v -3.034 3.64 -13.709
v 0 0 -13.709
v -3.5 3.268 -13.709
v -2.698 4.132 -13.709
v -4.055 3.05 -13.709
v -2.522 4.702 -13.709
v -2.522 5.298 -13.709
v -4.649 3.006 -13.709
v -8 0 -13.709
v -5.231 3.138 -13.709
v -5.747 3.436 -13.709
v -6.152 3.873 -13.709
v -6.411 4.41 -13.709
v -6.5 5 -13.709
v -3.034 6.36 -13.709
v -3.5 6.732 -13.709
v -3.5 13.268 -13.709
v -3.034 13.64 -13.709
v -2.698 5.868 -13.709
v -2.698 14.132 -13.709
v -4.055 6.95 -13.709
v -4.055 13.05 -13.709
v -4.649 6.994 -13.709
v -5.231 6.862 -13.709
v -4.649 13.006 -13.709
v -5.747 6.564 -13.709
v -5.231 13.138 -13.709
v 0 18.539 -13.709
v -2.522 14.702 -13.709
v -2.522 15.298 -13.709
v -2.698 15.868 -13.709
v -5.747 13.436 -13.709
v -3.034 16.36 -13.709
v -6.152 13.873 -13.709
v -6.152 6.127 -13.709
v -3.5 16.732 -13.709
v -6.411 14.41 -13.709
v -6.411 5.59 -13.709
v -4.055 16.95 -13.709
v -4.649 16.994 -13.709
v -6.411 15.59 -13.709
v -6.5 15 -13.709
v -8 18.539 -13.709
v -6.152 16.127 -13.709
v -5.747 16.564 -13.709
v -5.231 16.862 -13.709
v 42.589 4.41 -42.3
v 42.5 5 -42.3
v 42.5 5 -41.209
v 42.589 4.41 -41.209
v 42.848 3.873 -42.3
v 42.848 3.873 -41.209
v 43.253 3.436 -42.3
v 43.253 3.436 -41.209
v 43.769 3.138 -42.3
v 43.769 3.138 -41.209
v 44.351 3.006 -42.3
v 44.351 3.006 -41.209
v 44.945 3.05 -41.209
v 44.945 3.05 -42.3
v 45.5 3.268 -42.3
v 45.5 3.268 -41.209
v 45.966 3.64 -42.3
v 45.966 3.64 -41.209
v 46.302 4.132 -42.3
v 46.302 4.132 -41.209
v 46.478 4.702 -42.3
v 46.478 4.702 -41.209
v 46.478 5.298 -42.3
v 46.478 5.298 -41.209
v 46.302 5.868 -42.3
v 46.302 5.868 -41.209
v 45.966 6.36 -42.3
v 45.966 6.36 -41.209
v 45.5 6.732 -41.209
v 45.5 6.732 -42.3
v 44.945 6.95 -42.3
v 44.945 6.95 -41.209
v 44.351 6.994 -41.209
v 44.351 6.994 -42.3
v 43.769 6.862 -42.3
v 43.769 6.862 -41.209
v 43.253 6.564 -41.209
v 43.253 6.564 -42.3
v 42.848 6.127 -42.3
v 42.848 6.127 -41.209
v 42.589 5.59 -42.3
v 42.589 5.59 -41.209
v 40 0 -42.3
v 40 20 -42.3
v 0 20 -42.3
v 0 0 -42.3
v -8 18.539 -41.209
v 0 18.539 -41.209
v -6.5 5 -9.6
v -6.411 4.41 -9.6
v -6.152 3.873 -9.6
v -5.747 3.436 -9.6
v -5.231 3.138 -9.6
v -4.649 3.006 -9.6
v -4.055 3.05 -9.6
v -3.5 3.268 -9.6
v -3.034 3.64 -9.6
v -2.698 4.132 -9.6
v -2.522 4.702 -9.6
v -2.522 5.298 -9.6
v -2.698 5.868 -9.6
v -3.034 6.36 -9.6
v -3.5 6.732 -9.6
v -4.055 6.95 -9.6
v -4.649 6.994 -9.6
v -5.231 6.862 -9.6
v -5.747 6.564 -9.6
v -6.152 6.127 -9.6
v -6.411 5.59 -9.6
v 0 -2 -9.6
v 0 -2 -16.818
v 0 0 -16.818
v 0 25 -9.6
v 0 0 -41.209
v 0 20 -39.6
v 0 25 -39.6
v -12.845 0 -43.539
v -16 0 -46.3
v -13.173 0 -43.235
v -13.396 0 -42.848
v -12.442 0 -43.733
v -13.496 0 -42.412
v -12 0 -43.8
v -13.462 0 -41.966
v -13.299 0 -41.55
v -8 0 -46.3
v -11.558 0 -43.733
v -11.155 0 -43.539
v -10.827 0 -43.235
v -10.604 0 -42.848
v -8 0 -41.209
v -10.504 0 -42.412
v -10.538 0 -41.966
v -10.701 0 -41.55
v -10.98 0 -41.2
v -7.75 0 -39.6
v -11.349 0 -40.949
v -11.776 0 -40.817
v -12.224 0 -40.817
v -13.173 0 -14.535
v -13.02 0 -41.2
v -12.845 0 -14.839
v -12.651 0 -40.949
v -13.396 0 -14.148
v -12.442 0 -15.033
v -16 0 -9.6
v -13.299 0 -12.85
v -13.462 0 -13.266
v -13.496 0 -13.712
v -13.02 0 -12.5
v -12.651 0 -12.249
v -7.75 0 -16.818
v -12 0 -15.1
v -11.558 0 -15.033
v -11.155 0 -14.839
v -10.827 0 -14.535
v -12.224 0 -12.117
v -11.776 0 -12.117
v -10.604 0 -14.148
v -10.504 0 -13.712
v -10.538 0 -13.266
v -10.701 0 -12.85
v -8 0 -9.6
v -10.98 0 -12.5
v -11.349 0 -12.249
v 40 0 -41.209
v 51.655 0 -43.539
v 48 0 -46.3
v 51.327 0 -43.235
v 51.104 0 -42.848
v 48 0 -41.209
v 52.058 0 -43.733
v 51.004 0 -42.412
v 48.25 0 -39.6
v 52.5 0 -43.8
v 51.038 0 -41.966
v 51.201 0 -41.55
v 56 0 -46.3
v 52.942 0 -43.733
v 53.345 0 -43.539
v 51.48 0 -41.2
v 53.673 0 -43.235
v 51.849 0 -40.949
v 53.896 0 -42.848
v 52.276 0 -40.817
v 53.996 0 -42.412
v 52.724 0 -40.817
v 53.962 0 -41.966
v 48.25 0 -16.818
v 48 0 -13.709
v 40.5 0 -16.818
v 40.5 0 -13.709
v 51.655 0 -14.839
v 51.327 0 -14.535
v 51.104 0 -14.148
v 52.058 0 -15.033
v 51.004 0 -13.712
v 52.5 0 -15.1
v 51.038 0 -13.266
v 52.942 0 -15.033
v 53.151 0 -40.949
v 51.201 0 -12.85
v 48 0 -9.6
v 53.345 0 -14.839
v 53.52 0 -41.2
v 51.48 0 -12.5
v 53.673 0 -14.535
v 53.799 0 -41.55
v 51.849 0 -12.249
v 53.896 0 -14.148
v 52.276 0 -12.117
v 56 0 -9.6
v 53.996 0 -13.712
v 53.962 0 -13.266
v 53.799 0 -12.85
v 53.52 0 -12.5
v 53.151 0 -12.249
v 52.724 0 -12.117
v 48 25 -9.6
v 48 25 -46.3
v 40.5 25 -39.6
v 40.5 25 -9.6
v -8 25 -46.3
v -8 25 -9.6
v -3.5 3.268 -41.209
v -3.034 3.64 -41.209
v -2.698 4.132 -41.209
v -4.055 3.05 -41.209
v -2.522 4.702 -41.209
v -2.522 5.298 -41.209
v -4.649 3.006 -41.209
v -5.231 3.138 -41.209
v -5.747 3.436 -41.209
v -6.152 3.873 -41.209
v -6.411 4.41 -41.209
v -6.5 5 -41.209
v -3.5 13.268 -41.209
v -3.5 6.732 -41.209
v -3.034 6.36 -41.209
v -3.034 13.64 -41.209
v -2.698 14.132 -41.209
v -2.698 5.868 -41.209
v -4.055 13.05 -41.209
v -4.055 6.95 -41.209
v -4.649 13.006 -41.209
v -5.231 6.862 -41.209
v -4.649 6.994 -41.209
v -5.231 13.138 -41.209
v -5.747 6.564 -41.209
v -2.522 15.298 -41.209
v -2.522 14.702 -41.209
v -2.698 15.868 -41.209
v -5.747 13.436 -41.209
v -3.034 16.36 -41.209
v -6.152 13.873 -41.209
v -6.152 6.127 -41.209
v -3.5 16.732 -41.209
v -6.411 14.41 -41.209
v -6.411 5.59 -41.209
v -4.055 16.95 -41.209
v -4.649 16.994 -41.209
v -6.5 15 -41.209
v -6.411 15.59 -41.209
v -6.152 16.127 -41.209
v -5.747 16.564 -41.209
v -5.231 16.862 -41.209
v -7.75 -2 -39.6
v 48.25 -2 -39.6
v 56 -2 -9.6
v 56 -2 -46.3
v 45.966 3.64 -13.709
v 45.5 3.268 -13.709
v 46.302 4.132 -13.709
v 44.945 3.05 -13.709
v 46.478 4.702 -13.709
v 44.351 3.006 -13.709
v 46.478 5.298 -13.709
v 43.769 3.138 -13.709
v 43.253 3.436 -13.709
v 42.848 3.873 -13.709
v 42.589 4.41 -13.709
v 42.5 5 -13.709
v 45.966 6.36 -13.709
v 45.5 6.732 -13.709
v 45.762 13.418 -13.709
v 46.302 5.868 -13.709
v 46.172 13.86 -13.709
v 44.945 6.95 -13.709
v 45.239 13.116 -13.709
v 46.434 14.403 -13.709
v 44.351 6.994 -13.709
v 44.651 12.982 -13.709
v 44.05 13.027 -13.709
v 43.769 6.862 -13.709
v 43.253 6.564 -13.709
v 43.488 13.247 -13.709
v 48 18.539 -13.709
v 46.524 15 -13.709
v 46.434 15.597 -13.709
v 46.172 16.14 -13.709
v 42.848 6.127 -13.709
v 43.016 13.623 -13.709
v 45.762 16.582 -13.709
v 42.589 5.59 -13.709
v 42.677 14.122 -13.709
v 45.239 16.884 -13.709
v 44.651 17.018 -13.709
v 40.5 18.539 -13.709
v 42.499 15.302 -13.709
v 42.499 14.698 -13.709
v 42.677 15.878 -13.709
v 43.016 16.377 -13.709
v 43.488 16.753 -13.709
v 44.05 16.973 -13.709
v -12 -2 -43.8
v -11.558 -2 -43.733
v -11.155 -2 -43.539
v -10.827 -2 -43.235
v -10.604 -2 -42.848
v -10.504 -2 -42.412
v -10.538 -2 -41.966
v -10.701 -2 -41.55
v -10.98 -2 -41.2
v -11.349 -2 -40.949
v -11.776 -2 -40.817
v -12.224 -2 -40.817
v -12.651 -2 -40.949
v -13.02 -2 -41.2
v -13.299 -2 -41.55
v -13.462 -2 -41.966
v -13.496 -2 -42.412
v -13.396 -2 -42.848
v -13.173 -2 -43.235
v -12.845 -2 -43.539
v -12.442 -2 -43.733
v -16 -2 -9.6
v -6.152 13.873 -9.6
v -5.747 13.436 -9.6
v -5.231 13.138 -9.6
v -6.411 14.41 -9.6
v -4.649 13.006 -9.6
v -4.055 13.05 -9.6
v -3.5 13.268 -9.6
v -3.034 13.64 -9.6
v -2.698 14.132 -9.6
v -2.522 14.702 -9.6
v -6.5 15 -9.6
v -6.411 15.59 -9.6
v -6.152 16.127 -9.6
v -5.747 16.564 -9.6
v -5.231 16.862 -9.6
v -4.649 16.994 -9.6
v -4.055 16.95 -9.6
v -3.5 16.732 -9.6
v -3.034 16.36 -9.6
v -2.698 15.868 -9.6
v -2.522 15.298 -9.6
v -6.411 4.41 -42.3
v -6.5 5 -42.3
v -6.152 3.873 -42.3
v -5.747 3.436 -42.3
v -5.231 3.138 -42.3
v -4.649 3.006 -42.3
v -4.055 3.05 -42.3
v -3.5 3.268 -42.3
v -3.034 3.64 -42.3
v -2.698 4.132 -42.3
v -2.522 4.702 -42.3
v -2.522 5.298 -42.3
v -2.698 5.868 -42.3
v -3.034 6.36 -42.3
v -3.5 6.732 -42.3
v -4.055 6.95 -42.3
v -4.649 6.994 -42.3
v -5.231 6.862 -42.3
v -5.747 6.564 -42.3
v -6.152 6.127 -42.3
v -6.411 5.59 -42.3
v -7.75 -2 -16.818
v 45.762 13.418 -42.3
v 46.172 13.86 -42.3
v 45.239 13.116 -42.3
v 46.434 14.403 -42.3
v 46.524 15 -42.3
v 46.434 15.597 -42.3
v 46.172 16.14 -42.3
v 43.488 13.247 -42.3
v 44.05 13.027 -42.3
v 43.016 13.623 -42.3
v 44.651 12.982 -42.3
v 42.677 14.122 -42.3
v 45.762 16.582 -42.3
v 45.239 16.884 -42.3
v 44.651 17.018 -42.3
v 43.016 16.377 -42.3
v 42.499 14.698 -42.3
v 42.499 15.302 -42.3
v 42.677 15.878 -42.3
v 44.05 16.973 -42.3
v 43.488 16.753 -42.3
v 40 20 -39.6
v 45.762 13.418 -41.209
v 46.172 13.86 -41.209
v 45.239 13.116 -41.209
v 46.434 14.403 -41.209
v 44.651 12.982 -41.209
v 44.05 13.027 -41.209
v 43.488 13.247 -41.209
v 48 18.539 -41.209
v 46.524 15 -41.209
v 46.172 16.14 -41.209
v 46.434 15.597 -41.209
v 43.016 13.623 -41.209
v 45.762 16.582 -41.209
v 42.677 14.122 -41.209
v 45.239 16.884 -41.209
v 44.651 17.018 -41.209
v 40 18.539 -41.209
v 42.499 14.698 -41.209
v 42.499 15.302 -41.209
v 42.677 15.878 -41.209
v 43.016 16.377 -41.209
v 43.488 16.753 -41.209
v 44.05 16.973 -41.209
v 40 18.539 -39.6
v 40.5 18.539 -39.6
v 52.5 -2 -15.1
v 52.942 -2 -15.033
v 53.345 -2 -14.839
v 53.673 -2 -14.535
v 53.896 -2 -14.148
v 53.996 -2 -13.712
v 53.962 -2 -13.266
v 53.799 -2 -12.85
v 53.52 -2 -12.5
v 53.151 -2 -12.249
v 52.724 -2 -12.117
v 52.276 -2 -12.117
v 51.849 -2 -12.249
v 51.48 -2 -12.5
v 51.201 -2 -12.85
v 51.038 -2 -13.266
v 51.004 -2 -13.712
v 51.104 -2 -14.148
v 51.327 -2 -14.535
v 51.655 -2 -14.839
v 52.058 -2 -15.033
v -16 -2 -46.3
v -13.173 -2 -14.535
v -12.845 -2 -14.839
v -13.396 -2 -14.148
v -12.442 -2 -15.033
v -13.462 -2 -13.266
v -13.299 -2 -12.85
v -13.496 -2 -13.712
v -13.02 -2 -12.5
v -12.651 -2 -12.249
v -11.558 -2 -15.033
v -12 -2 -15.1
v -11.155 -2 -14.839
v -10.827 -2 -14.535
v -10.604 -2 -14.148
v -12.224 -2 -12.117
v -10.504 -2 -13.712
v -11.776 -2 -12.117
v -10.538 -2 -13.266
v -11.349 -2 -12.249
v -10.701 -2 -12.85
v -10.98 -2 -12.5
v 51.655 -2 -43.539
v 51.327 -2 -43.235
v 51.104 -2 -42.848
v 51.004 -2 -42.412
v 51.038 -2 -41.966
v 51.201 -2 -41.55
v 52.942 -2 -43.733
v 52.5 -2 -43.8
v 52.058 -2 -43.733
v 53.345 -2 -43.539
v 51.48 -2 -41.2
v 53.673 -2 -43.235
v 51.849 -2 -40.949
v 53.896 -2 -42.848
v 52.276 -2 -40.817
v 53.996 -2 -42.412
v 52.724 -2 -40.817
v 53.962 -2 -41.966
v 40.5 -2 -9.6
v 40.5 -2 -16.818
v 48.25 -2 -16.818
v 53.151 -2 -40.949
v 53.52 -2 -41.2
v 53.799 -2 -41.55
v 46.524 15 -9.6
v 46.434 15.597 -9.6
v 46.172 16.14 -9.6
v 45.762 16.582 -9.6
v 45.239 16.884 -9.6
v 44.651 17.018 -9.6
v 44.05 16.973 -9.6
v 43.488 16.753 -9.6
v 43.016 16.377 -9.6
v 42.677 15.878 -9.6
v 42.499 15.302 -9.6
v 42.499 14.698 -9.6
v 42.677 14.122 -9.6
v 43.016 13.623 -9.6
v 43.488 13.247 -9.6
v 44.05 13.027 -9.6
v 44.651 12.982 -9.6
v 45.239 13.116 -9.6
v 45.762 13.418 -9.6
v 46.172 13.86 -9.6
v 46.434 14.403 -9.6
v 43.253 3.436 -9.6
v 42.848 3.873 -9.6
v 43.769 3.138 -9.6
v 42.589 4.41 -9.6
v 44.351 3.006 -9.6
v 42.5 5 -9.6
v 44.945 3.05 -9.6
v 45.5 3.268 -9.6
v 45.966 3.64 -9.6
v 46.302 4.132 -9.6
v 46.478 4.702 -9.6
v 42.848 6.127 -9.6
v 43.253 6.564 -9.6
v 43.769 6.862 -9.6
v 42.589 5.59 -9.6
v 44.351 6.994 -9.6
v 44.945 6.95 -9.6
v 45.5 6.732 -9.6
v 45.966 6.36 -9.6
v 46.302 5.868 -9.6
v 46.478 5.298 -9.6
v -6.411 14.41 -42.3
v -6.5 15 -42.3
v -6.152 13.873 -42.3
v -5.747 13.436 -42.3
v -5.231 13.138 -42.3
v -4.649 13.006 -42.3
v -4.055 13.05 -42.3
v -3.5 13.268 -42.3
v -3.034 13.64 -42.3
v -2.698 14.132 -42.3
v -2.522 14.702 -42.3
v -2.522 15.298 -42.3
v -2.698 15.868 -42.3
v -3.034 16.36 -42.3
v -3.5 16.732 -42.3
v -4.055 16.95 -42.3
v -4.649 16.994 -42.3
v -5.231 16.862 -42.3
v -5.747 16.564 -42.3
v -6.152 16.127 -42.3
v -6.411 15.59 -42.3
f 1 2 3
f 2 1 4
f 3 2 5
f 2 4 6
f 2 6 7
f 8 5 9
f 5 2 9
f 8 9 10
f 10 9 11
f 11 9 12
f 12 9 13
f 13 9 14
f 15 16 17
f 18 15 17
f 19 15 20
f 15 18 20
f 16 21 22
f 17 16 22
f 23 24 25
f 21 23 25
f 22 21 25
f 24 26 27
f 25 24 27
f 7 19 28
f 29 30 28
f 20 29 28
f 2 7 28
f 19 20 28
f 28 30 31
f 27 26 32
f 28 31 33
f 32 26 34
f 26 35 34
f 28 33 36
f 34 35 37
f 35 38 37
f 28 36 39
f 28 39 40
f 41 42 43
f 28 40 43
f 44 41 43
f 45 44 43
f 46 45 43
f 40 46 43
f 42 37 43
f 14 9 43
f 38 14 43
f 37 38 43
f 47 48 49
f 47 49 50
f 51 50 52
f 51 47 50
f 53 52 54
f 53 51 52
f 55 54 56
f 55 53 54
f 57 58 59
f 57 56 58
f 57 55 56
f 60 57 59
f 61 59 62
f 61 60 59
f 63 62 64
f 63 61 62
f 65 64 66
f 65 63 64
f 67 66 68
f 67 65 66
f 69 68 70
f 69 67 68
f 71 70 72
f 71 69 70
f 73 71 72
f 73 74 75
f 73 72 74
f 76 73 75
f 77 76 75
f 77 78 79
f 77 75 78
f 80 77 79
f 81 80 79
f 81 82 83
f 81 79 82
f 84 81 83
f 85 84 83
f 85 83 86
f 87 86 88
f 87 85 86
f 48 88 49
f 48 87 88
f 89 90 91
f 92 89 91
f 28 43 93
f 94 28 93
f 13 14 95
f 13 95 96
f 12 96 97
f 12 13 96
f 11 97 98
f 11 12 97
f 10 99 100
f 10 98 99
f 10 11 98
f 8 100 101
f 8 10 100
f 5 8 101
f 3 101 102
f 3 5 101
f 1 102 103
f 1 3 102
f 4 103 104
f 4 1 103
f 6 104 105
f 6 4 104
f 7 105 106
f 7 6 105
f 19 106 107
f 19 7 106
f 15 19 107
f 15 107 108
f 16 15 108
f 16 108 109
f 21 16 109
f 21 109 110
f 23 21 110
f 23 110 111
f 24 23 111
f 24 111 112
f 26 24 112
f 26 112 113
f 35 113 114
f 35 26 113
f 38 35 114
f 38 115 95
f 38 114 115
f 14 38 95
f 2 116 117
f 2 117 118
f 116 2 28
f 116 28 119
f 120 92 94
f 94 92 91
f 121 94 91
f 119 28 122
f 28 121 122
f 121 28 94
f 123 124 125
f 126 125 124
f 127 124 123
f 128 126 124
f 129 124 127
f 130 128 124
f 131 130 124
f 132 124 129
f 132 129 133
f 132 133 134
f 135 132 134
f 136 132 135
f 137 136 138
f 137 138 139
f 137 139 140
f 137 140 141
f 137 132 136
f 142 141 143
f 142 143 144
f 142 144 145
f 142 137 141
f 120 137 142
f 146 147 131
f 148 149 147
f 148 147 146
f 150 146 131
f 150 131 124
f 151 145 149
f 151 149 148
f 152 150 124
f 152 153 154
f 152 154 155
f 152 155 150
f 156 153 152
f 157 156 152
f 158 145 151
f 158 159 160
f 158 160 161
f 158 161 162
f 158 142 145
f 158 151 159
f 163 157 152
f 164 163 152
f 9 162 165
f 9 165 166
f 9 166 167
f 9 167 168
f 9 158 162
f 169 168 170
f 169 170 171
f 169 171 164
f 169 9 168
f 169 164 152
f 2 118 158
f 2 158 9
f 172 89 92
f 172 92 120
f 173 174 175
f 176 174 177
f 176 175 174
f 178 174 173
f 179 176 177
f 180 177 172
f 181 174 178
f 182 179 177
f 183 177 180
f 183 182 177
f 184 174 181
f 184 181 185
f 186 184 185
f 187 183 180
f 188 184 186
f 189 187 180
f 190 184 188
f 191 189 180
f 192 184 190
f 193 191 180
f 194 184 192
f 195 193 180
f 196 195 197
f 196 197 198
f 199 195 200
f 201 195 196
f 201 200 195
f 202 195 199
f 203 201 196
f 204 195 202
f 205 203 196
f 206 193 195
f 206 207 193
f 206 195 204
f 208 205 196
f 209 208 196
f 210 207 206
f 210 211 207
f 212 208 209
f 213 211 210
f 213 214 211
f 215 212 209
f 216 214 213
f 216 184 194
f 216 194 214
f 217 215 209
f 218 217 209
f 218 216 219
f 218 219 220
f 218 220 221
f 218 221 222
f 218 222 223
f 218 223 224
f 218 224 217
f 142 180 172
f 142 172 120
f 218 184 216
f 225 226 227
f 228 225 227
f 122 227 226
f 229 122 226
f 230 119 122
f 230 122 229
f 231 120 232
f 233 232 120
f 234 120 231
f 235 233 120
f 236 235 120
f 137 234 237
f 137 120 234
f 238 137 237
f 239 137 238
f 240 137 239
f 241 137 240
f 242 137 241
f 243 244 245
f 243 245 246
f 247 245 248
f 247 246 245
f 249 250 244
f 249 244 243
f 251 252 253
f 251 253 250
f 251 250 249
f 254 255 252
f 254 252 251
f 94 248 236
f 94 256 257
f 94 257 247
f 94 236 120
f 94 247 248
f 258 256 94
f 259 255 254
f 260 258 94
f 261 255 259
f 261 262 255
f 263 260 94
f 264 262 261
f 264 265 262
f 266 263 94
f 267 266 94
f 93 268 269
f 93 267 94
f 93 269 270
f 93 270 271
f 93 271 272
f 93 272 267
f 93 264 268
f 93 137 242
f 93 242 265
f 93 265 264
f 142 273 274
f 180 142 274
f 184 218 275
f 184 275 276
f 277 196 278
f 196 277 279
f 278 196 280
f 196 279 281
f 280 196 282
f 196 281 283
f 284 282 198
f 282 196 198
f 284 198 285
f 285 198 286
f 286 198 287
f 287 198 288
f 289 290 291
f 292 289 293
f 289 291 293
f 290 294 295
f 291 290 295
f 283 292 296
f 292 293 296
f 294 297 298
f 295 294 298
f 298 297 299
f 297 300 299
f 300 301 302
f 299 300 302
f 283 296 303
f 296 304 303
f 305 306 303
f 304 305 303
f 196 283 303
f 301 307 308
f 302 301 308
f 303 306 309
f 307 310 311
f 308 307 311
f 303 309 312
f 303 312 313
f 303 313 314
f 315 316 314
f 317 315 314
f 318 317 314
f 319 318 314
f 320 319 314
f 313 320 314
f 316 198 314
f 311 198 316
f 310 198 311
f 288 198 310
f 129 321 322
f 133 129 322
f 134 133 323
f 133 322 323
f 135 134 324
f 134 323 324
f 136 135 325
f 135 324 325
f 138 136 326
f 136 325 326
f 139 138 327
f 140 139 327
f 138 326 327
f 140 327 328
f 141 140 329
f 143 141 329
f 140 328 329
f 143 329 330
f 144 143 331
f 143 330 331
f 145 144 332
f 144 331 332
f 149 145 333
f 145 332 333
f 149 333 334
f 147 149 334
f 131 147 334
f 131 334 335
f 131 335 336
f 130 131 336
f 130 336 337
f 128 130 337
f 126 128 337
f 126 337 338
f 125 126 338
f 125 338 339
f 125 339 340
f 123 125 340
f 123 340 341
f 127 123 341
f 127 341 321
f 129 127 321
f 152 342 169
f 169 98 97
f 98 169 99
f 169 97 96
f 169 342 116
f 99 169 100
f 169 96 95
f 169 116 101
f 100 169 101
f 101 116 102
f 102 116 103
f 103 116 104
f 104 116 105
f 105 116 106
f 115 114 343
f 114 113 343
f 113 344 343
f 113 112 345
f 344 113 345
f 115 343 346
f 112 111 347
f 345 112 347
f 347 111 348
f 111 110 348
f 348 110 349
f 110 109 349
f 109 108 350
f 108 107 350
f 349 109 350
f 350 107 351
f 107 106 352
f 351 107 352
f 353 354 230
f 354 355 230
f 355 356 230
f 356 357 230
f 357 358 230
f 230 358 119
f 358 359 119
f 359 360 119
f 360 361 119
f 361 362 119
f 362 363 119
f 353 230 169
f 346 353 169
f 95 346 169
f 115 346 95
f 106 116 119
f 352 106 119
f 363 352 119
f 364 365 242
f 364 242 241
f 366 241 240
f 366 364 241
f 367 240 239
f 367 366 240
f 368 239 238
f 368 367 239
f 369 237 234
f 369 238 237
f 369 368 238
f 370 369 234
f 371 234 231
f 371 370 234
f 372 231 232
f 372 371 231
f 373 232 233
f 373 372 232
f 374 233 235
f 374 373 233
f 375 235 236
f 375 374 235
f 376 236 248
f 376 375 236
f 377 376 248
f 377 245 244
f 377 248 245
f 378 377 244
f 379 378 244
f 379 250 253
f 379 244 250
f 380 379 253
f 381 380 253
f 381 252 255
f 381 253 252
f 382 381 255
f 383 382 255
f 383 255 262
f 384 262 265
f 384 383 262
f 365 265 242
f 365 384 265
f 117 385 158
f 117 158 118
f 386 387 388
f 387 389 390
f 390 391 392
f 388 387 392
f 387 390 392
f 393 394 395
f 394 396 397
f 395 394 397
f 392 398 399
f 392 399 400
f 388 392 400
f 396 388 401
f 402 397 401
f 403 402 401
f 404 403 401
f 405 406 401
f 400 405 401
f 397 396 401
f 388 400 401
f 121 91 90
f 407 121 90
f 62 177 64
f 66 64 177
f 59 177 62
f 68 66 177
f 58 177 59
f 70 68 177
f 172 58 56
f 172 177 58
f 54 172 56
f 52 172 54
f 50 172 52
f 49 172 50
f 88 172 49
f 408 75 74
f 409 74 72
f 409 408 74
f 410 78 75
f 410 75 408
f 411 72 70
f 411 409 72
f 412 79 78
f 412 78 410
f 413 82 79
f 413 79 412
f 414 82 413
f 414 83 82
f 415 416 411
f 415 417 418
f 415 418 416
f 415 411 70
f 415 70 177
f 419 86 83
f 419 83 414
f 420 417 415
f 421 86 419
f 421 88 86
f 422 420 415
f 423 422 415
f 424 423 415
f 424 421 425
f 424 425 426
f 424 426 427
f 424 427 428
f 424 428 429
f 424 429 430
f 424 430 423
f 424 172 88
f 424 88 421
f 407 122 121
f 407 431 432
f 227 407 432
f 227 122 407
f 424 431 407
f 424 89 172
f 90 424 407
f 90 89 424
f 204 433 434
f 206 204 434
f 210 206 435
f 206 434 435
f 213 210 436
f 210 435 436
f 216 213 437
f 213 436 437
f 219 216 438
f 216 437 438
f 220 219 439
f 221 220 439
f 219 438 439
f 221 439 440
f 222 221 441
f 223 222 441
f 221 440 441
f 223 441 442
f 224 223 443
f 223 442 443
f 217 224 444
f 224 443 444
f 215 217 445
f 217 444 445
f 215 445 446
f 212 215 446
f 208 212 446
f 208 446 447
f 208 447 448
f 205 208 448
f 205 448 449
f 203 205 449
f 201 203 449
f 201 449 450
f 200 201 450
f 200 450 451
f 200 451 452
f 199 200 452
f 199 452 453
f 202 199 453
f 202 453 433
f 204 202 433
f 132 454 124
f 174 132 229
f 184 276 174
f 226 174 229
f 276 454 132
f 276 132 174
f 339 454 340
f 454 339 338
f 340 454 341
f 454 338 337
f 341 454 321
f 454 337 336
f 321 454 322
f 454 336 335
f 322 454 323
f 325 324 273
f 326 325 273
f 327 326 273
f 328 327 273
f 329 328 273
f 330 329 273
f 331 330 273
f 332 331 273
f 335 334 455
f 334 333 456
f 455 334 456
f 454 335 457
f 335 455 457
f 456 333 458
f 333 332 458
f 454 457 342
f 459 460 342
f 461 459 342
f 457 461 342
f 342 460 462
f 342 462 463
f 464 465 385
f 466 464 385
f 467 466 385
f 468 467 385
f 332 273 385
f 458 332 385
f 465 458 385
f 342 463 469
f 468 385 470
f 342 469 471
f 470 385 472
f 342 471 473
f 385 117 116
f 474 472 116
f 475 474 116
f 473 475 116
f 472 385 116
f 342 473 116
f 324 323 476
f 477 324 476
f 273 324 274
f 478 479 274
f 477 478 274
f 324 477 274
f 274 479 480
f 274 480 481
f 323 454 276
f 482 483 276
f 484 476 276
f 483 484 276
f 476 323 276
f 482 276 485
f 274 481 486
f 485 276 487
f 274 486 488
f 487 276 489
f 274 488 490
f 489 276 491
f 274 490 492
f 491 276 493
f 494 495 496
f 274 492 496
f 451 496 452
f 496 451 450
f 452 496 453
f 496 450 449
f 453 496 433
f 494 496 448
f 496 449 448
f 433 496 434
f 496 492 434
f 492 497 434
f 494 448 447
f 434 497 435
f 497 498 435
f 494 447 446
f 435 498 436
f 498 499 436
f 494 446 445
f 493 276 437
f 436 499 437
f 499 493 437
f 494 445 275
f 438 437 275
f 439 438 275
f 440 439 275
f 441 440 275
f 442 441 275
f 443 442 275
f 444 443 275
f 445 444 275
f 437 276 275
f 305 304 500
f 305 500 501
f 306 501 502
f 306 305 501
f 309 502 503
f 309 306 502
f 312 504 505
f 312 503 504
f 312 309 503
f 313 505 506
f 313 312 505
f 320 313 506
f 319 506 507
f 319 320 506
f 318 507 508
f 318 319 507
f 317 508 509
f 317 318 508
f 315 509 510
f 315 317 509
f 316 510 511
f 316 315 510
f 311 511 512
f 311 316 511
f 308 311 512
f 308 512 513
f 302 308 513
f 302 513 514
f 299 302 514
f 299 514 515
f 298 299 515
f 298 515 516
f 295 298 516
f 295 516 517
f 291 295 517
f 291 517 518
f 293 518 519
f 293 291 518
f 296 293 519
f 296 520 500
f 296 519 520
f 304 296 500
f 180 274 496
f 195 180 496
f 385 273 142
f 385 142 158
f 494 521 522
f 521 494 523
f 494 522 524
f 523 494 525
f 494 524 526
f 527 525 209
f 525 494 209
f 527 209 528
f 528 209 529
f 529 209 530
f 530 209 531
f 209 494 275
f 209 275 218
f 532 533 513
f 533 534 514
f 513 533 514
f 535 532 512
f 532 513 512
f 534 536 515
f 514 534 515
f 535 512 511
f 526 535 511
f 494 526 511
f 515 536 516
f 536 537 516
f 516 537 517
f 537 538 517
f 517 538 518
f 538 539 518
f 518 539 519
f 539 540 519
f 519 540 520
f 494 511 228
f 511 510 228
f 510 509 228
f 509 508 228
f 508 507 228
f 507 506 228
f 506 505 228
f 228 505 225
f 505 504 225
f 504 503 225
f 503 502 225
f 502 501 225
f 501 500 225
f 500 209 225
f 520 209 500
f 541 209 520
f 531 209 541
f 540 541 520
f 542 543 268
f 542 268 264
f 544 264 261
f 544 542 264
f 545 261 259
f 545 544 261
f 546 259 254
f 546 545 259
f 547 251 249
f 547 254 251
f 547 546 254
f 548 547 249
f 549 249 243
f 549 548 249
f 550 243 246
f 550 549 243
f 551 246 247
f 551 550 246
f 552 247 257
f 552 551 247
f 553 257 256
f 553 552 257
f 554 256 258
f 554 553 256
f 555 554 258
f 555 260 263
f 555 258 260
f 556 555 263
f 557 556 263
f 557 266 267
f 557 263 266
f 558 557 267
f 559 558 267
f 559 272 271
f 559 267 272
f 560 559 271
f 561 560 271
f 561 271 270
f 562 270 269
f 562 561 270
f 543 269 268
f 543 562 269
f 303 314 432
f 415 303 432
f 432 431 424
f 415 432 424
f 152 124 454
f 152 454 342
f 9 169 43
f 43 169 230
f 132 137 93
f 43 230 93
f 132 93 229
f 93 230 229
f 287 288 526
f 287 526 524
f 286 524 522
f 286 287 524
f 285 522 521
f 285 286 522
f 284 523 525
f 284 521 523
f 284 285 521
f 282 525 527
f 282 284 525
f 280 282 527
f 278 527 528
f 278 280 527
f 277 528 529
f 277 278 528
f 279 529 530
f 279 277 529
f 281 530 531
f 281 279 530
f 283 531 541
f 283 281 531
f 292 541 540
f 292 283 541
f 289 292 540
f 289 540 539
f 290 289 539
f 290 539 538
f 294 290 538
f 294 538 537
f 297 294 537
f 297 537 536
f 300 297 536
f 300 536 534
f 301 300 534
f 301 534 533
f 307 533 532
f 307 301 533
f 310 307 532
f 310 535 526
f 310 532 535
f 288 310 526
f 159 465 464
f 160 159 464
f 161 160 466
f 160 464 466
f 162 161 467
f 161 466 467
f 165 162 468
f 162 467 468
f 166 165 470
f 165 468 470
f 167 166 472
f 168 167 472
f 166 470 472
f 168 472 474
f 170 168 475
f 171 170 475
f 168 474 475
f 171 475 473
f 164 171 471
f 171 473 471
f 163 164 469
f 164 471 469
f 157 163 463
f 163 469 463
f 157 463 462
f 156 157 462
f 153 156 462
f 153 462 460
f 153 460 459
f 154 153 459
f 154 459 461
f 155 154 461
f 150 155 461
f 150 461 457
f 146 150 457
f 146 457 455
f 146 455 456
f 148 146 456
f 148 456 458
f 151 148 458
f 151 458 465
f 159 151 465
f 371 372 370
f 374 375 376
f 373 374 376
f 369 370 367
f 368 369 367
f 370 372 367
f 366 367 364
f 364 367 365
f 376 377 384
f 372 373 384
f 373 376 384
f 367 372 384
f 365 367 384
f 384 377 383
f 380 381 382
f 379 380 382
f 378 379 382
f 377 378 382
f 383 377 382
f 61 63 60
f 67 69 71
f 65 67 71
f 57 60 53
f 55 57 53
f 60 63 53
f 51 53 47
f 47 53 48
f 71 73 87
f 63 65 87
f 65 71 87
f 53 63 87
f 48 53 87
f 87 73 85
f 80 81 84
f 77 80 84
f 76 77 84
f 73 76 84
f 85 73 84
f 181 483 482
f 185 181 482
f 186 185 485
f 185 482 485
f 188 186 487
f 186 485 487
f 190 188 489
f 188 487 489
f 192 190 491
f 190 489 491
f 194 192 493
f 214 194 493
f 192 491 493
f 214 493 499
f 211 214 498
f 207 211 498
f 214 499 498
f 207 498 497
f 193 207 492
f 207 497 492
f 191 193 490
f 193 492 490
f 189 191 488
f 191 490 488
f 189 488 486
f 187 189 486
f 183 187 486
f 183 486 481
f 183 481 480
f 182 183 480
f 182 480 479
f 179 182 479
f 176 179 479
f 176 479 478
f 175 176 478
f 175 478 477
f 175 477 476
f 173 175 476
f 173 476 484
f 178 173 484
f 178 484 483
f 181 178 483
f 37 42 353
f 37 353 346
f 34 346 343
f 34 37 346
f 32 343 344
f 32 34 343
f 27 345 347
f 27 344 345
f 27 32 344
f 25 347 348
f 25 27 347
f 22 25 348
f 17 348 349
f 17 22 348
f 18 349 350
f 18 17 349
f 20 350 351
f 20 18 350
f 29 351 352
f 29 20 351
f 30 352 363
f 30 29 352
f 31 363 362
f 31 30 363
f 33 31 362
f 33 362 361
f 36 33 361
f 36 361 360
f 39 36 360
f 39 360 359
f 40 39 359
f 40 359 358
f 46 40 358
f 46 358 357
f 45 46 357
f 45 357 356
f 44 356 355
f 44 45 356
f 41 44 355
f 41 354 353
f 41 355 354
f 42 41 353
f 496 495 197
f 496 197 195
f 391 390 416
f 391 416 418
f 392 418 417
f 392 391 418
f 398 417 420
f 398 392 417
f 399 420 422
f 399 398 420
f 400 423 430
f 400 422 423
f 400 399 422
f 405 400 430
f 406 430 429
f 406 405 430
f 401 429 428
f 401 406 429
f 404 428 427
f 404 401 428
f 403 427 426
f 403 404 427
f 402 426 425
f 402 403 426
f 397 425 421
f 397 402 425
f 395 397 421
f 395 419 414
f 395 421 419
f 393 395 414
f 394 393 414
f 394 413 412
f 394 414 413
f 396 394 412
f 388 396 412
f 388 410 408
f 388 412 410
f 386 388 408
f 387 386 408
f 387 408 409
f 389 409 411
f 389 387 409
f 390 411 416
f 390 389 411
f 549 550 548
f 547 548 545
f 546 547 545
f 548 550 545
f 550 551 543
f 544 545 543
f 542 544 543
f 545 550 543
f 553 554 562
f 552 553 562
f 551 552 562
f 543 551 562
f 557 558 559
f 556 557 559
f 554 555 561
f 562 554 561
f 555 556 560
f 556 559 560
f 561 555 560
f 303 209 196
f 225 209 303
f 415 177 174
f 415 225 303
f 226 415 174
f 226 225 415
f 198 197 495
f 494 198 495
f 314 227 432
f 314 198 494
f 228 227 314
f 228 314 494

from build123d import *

# Parameters (mm, degrees)
SKETCH_1_W               = 40
SKETCH_1_H               = 40
EXTRUDE_1_DEPTH          = 20
SKETCH_2_R               = 3
EXTRUDE_2_DEPTH          = 4.5
SKETCH_4_R               = 2
SKETCH_4_W               = 8
SKETCH_4_H               = 20
EXTRUDE_4_DEPTH          = 2.7
SKETCH_5_W               = 4
SKETCH_5_H               = 7
EXTRUDE_5_DEPTH          = 7
SKETCH_6_W               = 48
SKETCH_6_H               = 20
CUT_EXTRUDE_1_DEPTH      = 27.5
CUT_EXTRUDE_3_DEPTH      = 54.481305145
CUT_EXTRUDE_3_DEPTH_BACK = 54.481305145
SKETCH_7_W               = 40
SKETCH_7_H               = 20
SKETCH_8_W               = 56
SKETCH_8_H               = 5
EXTRUDE_6_DEPTH          = 2.7
SKETCH_9_W               = 56
SKETCH_9_H               = 25
EXTRUDE_7_DEPTH          = 30
CUT_EXTRUDE_4_DEPTH      = 62.878914018
CUT_EXTRUDE_4_DEPTH_BACK = 62.878914018
SKETCH_10_W              = 40
SKETCH_10_H              = 20
CUT_EXTRUDE_5_DEPTH      = 64.232033021
CUT_EXTRUDE_5_DEPTH_BACK = 64.232033021
SKETCH_11_R              = 2
SKETCH_11_R_2            = 2.023853946
CUT_EXTRUDE_6_DEPTH      = 75.500268456
CUT_EXTRUDE_6_DEPTH_BACK = 75.500268456
SKETCH_12_W              = 27.5
SKETCH_12_H              = 18.538560396
SKETCH_13_W              = 56
SKETCH_13_H              = 25
EXTRUDE_8_DEPTH          = 4
SKETCH_14_W              = 36.7
SKETCH_14_H              = 2
EXTRUDE_9_DEPTH          = 56
SKETCH_15_W              = 36.7
SKETCH_15_H              = 2
EXTRUDE_10_DEPTH         = 8
SKETCH_16_W              = 36.7
SKETCH_16_H              = 2
EXTRUDE_11_DEPTH         = 8
CUT_EXTRUDE_7_DEPTH      = 76.918969961
CUT_EXTRUDE_7_DEPTH_BACK = 76.918969961
SKETCH_17_W              = 40.5
SKETCH_17_H              = 30
SKETCH_20_W              = 7.75
SKETCH_20_H              = 22.78217045
CUT_EXTRUDE_9_DEPTH      = 8
SKETCH_21_R              = 1.5
CUT_EXTRUDE_10_DEPTH     = 78.515740337


with BuildPart() as part:
    # 草图1 → 凸台-拉伸1 (new body)
    with BuildSketch(Plane(origin=(0, 0, 0), x_dir=(1, 0, 0), z_dir=(0, 1, 0))):
        with Locations((20, 20)):
            Rectangle(SKETCH_1_W, SKETCH_1_H)
    extrude(amount=EXTRUDE_1_DEPTH)

    # 草图2 → 凸台-拉伸2 (add)
    with BuildSketch(Plane.XY):
        with Locations(Location((10, 10, 0), (0, 0, 180))):
            Circle(SKETCH_2_R)
    extrude(amount=EXTRUDE_2_DEPTH)

    # 草图4 → 凸台-拉伸4 (add)
    # profile 1 of 3: a face of its own
    with BuildSketch(Plane(origin=(0, 0, -12.3), x_dir=(-1, 0, 0), z_dir=(0, 0, -1))):
        with BuildLine():
            Line((-44.5, 17), (-44.5, 20))
            Line((-44.5, 20), (-48, 20))
            Line((-48, 20), (-48, 0))
            Line((-48, 0), (-40, 0))
            Line((-40, 0), (-40, 15))
            Line((-40, 15), (-42.5, 15))
            ThreePointArc((-42.5, 15), (-45.914213562, 13.585786438), (-44.5, 17))
        make_face()
        with Locations((-44.5, 5)):
            Circle(SKETCH_4_R, mode=Mode.SUBTRACT)
    # profile 2 of 3: a face of its own
    with BuildSketch(Plane(origin=(0, 0, -12.3), x_dir=(-1, 0, 0), z_dir=(0, 0, -1))):
        with BuildLine():
            Line((-40, 15), (-40, 20))
            Line((-40, 20), (-44.5, 20))
            Line((-44.5, 20), (-44.5, 17))
            ThreePointArc((-44.5, 17), (-43.085786438, 16.414213562), (-42.5, 15))
            Line((-42.5, 15), (-40, 15))
        make_face()
    # profile 3 of 3: a face of its own
    with BuildSketch(Plane(origin=(0, 0, -12.3), x_dir=(-1, 0, 0), z_dir=(0, 0, -1))):
        with Locations((4, 10)):
            Rectangle(SKETCH_4_W, SKETCH_4_H)
        with Locations((4.5, 5)):
            Circle(SKETCH_4_R, mode=Mode.SUBTRACT)
        with Locations((4.5, 15)):
            Circle(SKETCH_4_R, mode=Mode.SUBTRACT)
    extrude(amount=-EXTRUDE_4_DEPTH)

    # 草图5 → 凸台-拉伸5 (add)
    with BuildSketch(Plane.ZY):
        with Locations((-35, 10)):
            Rectangle(SKETCH_5_W, SKETCH_5_H)
    extrude(amount=EXTRUDE_5_DEPTH)

    # 草图6 → 切除-拉伸1 (cut)
    with BuildSketch(Plane(origin=(0, 0, -40), x_dir=(-1, 0, 0), z_dir=(0, 0, -1))):
        with Locations((-16, 10)):
            Rectangle(SKETCH_6_W, SKETCH_6_H)
    extrude(amount=-CUT_EXTRUDE_1_DEPTH, mode=Mode.SUBTRACT)

    # 草图7 → 切除-拉伸3 (cut, two sides: drawn at the far end of the back side and taken through both)
    with BuildSketch(Plane.XY.offset(-CUT_EXTRUDE_3_DEPTH_BACK)):
        with Locations((20, 10)):
            Rectangle(SKETCH_7_W, SKETCH_7_H)
    extrude(amount=CUT_EXTRUDE_3_DEPTH + CUT_EXTRUDE_3_DEPTH_BACK, mode=Mode.SUBTRACT)


with BuildPart() as cut_extrude_3_piece_1:
    # of the separate pieces the step leaves, piece 1, a body of its own (cut_extrude_3_pieces)
    add(part.part.solids().sort_by_distance((0, 20, -9.6))[0])



with BuildPart() as cut_extrude_3_piece_2:
    # of the separate pieces the step leaves, piece 2, a body of its own (cut_extrude_3_pieces)
    add(part.part.solids().sort_by_distance((40, 0, -9.6))[0])


with BuildPart() as cut_extrude_3_piece_1_1:
    add(cut_extrude_3_piece_1.part)

    add(cut_extrude_3_piece_2.part)  # 凸台-拉伸6 merges 切除-拉伸3 piece 2
    # 草图8 → 凸台-拉伸6 (add)
    with BuildSketch(Plane.XY.offset(-9.6)):
        with Locations((20, 22.5)):
            Rectangle(SKETCH_8_W, SKETCH_8_H)
    extrude(amount=-EXTRUDE_6_DEPTH)

    # 草图9 → 凸台-拉伸7 (add)
    with BuildSketch(Plane(origin=(0, 0, -12.3), x_dir=(-1, 0, 0), z_dir=(0, 0, -1))):
        with Locations((-20, 12.5)):
            Rectangle(SKETCH_9_W, SKETCH_9_H)
    extrude(amount=EXTRUDE_7_DEPTH)

    # 草图10 → 切除-拉伸4 (cut, two sides: drawn at the far end of the back side and taken through both)
    with BuildSketch(Plane.XY.offset(-12.3).offset(-CUT_EXTRUDE_4_DEPTH_BACK)):
        with Locations((20, 10)):
            Rectangle(SKETCH_10_W, SKETCH_10_H)
    extrude(amount=CUT_EXTRUDE_4_DEPTH + CUT_EXTRUDE_4_DEPTH_BACK, mode=Mode.SUBTRACT)

    # 草图11 → 切除-拉伸5 (cut, two sides: drawn at the far end of the back side and taken through both)
    with BuildSketch(Plane.XY.offset(-9.6).offset(-CUT_EXTRUDE_5_DEPTH_BACK)):
        with Locations(Location((-4.5, 15, 0), (0, 0, 180))):
            Circle(SKETCH_11_R)
        with Locations(Location((-4.5, 5, 0), (0, 0, 180))):
            Circle(SKETCH_11_R)
        with Locations((44.5, 15)):
            Circle(SKETCH_11_R_2)
        with Locations(Location((44.5, 5, 0), (0, 0, 180))):
            Circle(SKETCH_11_R)
    extrude(amount=CUT_EXTRUDE_5_DEPTH + CUT_EXTRUDE_5_DEPTH_BACK, mode=Mode.SUBTRACT)

    # 草图12 → 切除-拉伸6 (cut, two sides: drawn at the far end of the back side and taken through both)
    with BuildSketch(Plane(origin=(48, 0, 0), x_dir=(0, 0, -1), z_dir=(1, 0, 0)).offset(-CUT_EXTRUDE_6_DEPTH_BACK)):
        with Locations((27.459022476, 9.269280198)):
            Rectangle(SKETCH_12_W, SKETCH_12_H)
    extrude(amount=CUT_EXTRUDE_6_DEPTH + CUT_EXTRUDE_6_DEPTH_BACK, mode=Mode.SUBTRACT)

    # 草图13 → 凸台-拉伸8 (add)
    with BuildSketch(Plane(origin=(0, 0, -42.3), x_dir=(-1, 0, 0), z_dir=(0, 0, -1))):
        with Locations((-20, 12.5)):
            Rectangle(SKETCH_13_W, SKETCH_13_H)
    extrude(amount=EXTRUDE_8_DEPTH)

    # 草图14 → 凸台-拉伸9 (add)
    with BuildSketch(Plane(origin=(48, 0, 0), x_dir=(0, 0, -1), z_dir=(1, 0, 0))):
        with Locations((27.95, -1)):
            Rectangle(SKETCH_14_W, SKETCH_14_H)
    extrude(amount=-EXTRUDE_9_DEPTH)

    # 草图15 → 凸台-拉伸10 (add)
    with BuildSketch(Plane(origin=(48, 0, 0), x_dir=(0, 0, -1), z_dir=(1, 0, 0))):
        with Locations((27.95, -1)):
            Rectangle(SKETCH_15_W, SKETCH_15_H)
    extrude(amount=EXTRUDE_10_DEPTH)

    # 草图16 → 凸台-拉伸11 (add)
    with BuildSketch(Plane.ZY.offset(8)):
        with Locations((-27.95, -1)):
            Rectangle(SKETCH_16_W, SKETCH_16_H)
    extrude(amount=EXTRUDE_11_DEPTH)

    # 草图17 → 切除-拉伸7 (cut, two sides: drawn at the far end of the back side and taken through both)
    with BuildSketch(Plane.XZ.offset(-20).offset(-CUT_EXTRUDE_7_DEPTH_BACK)):
        with Locations((20.25, -24.6)):
            Rectangle(SKETCH_17_W, SKETCH_17_H)
    extrude(amount=CUT_EXTRUDE_7_DEPTH + CUT_EXTRUDE_7_DEPTH_BACK, mode=Mode.SUBTRACT)

    # 草图20 → 切除-拉伸9 (cut)
    with BuildSketch(Plane.XZ.offset(2)):
        with Locations((-3.875, -28.208914775)):
            Rectangle(SKETCH_20_W, SKETCH_20_H)
        with Locations((44.375, -28.208914775)):
            Rectangle(SKETCH_20_W, SKETCH_20_H)
    extrude(amount=-CUT_EXTRUDE_9_DEPTH, mode=Mode.SUBTRACT)

    # 草图21 → 切除-拉伸10 (cut, through all)
    with BuildSketch(Plane.XZ.offset(2)):
        with Locations(Location((52.5, -42.3, 0), (0, 0, 270))):
            Circle(SKETCH_21_R)
        with Locations(Location((52.5, -13.6, 0), (0, 0, 270))):
            Circle(SKETCH_21_R)
        with Locations(Location((-12, -13.6, 0), (0, 0, 270))):
            Circle(SKETCH_21_R)
        with Locations(Location((-12, -42.3, 0), (0, 0, 270))):
            Circle(SKETCH_21_R)
    extrude(amount=-CUT_EXTRUDE_10_DEPTH, mode=Mode.SUBTRACT)


solid = cut_extrude_3_piece_1_1.part
